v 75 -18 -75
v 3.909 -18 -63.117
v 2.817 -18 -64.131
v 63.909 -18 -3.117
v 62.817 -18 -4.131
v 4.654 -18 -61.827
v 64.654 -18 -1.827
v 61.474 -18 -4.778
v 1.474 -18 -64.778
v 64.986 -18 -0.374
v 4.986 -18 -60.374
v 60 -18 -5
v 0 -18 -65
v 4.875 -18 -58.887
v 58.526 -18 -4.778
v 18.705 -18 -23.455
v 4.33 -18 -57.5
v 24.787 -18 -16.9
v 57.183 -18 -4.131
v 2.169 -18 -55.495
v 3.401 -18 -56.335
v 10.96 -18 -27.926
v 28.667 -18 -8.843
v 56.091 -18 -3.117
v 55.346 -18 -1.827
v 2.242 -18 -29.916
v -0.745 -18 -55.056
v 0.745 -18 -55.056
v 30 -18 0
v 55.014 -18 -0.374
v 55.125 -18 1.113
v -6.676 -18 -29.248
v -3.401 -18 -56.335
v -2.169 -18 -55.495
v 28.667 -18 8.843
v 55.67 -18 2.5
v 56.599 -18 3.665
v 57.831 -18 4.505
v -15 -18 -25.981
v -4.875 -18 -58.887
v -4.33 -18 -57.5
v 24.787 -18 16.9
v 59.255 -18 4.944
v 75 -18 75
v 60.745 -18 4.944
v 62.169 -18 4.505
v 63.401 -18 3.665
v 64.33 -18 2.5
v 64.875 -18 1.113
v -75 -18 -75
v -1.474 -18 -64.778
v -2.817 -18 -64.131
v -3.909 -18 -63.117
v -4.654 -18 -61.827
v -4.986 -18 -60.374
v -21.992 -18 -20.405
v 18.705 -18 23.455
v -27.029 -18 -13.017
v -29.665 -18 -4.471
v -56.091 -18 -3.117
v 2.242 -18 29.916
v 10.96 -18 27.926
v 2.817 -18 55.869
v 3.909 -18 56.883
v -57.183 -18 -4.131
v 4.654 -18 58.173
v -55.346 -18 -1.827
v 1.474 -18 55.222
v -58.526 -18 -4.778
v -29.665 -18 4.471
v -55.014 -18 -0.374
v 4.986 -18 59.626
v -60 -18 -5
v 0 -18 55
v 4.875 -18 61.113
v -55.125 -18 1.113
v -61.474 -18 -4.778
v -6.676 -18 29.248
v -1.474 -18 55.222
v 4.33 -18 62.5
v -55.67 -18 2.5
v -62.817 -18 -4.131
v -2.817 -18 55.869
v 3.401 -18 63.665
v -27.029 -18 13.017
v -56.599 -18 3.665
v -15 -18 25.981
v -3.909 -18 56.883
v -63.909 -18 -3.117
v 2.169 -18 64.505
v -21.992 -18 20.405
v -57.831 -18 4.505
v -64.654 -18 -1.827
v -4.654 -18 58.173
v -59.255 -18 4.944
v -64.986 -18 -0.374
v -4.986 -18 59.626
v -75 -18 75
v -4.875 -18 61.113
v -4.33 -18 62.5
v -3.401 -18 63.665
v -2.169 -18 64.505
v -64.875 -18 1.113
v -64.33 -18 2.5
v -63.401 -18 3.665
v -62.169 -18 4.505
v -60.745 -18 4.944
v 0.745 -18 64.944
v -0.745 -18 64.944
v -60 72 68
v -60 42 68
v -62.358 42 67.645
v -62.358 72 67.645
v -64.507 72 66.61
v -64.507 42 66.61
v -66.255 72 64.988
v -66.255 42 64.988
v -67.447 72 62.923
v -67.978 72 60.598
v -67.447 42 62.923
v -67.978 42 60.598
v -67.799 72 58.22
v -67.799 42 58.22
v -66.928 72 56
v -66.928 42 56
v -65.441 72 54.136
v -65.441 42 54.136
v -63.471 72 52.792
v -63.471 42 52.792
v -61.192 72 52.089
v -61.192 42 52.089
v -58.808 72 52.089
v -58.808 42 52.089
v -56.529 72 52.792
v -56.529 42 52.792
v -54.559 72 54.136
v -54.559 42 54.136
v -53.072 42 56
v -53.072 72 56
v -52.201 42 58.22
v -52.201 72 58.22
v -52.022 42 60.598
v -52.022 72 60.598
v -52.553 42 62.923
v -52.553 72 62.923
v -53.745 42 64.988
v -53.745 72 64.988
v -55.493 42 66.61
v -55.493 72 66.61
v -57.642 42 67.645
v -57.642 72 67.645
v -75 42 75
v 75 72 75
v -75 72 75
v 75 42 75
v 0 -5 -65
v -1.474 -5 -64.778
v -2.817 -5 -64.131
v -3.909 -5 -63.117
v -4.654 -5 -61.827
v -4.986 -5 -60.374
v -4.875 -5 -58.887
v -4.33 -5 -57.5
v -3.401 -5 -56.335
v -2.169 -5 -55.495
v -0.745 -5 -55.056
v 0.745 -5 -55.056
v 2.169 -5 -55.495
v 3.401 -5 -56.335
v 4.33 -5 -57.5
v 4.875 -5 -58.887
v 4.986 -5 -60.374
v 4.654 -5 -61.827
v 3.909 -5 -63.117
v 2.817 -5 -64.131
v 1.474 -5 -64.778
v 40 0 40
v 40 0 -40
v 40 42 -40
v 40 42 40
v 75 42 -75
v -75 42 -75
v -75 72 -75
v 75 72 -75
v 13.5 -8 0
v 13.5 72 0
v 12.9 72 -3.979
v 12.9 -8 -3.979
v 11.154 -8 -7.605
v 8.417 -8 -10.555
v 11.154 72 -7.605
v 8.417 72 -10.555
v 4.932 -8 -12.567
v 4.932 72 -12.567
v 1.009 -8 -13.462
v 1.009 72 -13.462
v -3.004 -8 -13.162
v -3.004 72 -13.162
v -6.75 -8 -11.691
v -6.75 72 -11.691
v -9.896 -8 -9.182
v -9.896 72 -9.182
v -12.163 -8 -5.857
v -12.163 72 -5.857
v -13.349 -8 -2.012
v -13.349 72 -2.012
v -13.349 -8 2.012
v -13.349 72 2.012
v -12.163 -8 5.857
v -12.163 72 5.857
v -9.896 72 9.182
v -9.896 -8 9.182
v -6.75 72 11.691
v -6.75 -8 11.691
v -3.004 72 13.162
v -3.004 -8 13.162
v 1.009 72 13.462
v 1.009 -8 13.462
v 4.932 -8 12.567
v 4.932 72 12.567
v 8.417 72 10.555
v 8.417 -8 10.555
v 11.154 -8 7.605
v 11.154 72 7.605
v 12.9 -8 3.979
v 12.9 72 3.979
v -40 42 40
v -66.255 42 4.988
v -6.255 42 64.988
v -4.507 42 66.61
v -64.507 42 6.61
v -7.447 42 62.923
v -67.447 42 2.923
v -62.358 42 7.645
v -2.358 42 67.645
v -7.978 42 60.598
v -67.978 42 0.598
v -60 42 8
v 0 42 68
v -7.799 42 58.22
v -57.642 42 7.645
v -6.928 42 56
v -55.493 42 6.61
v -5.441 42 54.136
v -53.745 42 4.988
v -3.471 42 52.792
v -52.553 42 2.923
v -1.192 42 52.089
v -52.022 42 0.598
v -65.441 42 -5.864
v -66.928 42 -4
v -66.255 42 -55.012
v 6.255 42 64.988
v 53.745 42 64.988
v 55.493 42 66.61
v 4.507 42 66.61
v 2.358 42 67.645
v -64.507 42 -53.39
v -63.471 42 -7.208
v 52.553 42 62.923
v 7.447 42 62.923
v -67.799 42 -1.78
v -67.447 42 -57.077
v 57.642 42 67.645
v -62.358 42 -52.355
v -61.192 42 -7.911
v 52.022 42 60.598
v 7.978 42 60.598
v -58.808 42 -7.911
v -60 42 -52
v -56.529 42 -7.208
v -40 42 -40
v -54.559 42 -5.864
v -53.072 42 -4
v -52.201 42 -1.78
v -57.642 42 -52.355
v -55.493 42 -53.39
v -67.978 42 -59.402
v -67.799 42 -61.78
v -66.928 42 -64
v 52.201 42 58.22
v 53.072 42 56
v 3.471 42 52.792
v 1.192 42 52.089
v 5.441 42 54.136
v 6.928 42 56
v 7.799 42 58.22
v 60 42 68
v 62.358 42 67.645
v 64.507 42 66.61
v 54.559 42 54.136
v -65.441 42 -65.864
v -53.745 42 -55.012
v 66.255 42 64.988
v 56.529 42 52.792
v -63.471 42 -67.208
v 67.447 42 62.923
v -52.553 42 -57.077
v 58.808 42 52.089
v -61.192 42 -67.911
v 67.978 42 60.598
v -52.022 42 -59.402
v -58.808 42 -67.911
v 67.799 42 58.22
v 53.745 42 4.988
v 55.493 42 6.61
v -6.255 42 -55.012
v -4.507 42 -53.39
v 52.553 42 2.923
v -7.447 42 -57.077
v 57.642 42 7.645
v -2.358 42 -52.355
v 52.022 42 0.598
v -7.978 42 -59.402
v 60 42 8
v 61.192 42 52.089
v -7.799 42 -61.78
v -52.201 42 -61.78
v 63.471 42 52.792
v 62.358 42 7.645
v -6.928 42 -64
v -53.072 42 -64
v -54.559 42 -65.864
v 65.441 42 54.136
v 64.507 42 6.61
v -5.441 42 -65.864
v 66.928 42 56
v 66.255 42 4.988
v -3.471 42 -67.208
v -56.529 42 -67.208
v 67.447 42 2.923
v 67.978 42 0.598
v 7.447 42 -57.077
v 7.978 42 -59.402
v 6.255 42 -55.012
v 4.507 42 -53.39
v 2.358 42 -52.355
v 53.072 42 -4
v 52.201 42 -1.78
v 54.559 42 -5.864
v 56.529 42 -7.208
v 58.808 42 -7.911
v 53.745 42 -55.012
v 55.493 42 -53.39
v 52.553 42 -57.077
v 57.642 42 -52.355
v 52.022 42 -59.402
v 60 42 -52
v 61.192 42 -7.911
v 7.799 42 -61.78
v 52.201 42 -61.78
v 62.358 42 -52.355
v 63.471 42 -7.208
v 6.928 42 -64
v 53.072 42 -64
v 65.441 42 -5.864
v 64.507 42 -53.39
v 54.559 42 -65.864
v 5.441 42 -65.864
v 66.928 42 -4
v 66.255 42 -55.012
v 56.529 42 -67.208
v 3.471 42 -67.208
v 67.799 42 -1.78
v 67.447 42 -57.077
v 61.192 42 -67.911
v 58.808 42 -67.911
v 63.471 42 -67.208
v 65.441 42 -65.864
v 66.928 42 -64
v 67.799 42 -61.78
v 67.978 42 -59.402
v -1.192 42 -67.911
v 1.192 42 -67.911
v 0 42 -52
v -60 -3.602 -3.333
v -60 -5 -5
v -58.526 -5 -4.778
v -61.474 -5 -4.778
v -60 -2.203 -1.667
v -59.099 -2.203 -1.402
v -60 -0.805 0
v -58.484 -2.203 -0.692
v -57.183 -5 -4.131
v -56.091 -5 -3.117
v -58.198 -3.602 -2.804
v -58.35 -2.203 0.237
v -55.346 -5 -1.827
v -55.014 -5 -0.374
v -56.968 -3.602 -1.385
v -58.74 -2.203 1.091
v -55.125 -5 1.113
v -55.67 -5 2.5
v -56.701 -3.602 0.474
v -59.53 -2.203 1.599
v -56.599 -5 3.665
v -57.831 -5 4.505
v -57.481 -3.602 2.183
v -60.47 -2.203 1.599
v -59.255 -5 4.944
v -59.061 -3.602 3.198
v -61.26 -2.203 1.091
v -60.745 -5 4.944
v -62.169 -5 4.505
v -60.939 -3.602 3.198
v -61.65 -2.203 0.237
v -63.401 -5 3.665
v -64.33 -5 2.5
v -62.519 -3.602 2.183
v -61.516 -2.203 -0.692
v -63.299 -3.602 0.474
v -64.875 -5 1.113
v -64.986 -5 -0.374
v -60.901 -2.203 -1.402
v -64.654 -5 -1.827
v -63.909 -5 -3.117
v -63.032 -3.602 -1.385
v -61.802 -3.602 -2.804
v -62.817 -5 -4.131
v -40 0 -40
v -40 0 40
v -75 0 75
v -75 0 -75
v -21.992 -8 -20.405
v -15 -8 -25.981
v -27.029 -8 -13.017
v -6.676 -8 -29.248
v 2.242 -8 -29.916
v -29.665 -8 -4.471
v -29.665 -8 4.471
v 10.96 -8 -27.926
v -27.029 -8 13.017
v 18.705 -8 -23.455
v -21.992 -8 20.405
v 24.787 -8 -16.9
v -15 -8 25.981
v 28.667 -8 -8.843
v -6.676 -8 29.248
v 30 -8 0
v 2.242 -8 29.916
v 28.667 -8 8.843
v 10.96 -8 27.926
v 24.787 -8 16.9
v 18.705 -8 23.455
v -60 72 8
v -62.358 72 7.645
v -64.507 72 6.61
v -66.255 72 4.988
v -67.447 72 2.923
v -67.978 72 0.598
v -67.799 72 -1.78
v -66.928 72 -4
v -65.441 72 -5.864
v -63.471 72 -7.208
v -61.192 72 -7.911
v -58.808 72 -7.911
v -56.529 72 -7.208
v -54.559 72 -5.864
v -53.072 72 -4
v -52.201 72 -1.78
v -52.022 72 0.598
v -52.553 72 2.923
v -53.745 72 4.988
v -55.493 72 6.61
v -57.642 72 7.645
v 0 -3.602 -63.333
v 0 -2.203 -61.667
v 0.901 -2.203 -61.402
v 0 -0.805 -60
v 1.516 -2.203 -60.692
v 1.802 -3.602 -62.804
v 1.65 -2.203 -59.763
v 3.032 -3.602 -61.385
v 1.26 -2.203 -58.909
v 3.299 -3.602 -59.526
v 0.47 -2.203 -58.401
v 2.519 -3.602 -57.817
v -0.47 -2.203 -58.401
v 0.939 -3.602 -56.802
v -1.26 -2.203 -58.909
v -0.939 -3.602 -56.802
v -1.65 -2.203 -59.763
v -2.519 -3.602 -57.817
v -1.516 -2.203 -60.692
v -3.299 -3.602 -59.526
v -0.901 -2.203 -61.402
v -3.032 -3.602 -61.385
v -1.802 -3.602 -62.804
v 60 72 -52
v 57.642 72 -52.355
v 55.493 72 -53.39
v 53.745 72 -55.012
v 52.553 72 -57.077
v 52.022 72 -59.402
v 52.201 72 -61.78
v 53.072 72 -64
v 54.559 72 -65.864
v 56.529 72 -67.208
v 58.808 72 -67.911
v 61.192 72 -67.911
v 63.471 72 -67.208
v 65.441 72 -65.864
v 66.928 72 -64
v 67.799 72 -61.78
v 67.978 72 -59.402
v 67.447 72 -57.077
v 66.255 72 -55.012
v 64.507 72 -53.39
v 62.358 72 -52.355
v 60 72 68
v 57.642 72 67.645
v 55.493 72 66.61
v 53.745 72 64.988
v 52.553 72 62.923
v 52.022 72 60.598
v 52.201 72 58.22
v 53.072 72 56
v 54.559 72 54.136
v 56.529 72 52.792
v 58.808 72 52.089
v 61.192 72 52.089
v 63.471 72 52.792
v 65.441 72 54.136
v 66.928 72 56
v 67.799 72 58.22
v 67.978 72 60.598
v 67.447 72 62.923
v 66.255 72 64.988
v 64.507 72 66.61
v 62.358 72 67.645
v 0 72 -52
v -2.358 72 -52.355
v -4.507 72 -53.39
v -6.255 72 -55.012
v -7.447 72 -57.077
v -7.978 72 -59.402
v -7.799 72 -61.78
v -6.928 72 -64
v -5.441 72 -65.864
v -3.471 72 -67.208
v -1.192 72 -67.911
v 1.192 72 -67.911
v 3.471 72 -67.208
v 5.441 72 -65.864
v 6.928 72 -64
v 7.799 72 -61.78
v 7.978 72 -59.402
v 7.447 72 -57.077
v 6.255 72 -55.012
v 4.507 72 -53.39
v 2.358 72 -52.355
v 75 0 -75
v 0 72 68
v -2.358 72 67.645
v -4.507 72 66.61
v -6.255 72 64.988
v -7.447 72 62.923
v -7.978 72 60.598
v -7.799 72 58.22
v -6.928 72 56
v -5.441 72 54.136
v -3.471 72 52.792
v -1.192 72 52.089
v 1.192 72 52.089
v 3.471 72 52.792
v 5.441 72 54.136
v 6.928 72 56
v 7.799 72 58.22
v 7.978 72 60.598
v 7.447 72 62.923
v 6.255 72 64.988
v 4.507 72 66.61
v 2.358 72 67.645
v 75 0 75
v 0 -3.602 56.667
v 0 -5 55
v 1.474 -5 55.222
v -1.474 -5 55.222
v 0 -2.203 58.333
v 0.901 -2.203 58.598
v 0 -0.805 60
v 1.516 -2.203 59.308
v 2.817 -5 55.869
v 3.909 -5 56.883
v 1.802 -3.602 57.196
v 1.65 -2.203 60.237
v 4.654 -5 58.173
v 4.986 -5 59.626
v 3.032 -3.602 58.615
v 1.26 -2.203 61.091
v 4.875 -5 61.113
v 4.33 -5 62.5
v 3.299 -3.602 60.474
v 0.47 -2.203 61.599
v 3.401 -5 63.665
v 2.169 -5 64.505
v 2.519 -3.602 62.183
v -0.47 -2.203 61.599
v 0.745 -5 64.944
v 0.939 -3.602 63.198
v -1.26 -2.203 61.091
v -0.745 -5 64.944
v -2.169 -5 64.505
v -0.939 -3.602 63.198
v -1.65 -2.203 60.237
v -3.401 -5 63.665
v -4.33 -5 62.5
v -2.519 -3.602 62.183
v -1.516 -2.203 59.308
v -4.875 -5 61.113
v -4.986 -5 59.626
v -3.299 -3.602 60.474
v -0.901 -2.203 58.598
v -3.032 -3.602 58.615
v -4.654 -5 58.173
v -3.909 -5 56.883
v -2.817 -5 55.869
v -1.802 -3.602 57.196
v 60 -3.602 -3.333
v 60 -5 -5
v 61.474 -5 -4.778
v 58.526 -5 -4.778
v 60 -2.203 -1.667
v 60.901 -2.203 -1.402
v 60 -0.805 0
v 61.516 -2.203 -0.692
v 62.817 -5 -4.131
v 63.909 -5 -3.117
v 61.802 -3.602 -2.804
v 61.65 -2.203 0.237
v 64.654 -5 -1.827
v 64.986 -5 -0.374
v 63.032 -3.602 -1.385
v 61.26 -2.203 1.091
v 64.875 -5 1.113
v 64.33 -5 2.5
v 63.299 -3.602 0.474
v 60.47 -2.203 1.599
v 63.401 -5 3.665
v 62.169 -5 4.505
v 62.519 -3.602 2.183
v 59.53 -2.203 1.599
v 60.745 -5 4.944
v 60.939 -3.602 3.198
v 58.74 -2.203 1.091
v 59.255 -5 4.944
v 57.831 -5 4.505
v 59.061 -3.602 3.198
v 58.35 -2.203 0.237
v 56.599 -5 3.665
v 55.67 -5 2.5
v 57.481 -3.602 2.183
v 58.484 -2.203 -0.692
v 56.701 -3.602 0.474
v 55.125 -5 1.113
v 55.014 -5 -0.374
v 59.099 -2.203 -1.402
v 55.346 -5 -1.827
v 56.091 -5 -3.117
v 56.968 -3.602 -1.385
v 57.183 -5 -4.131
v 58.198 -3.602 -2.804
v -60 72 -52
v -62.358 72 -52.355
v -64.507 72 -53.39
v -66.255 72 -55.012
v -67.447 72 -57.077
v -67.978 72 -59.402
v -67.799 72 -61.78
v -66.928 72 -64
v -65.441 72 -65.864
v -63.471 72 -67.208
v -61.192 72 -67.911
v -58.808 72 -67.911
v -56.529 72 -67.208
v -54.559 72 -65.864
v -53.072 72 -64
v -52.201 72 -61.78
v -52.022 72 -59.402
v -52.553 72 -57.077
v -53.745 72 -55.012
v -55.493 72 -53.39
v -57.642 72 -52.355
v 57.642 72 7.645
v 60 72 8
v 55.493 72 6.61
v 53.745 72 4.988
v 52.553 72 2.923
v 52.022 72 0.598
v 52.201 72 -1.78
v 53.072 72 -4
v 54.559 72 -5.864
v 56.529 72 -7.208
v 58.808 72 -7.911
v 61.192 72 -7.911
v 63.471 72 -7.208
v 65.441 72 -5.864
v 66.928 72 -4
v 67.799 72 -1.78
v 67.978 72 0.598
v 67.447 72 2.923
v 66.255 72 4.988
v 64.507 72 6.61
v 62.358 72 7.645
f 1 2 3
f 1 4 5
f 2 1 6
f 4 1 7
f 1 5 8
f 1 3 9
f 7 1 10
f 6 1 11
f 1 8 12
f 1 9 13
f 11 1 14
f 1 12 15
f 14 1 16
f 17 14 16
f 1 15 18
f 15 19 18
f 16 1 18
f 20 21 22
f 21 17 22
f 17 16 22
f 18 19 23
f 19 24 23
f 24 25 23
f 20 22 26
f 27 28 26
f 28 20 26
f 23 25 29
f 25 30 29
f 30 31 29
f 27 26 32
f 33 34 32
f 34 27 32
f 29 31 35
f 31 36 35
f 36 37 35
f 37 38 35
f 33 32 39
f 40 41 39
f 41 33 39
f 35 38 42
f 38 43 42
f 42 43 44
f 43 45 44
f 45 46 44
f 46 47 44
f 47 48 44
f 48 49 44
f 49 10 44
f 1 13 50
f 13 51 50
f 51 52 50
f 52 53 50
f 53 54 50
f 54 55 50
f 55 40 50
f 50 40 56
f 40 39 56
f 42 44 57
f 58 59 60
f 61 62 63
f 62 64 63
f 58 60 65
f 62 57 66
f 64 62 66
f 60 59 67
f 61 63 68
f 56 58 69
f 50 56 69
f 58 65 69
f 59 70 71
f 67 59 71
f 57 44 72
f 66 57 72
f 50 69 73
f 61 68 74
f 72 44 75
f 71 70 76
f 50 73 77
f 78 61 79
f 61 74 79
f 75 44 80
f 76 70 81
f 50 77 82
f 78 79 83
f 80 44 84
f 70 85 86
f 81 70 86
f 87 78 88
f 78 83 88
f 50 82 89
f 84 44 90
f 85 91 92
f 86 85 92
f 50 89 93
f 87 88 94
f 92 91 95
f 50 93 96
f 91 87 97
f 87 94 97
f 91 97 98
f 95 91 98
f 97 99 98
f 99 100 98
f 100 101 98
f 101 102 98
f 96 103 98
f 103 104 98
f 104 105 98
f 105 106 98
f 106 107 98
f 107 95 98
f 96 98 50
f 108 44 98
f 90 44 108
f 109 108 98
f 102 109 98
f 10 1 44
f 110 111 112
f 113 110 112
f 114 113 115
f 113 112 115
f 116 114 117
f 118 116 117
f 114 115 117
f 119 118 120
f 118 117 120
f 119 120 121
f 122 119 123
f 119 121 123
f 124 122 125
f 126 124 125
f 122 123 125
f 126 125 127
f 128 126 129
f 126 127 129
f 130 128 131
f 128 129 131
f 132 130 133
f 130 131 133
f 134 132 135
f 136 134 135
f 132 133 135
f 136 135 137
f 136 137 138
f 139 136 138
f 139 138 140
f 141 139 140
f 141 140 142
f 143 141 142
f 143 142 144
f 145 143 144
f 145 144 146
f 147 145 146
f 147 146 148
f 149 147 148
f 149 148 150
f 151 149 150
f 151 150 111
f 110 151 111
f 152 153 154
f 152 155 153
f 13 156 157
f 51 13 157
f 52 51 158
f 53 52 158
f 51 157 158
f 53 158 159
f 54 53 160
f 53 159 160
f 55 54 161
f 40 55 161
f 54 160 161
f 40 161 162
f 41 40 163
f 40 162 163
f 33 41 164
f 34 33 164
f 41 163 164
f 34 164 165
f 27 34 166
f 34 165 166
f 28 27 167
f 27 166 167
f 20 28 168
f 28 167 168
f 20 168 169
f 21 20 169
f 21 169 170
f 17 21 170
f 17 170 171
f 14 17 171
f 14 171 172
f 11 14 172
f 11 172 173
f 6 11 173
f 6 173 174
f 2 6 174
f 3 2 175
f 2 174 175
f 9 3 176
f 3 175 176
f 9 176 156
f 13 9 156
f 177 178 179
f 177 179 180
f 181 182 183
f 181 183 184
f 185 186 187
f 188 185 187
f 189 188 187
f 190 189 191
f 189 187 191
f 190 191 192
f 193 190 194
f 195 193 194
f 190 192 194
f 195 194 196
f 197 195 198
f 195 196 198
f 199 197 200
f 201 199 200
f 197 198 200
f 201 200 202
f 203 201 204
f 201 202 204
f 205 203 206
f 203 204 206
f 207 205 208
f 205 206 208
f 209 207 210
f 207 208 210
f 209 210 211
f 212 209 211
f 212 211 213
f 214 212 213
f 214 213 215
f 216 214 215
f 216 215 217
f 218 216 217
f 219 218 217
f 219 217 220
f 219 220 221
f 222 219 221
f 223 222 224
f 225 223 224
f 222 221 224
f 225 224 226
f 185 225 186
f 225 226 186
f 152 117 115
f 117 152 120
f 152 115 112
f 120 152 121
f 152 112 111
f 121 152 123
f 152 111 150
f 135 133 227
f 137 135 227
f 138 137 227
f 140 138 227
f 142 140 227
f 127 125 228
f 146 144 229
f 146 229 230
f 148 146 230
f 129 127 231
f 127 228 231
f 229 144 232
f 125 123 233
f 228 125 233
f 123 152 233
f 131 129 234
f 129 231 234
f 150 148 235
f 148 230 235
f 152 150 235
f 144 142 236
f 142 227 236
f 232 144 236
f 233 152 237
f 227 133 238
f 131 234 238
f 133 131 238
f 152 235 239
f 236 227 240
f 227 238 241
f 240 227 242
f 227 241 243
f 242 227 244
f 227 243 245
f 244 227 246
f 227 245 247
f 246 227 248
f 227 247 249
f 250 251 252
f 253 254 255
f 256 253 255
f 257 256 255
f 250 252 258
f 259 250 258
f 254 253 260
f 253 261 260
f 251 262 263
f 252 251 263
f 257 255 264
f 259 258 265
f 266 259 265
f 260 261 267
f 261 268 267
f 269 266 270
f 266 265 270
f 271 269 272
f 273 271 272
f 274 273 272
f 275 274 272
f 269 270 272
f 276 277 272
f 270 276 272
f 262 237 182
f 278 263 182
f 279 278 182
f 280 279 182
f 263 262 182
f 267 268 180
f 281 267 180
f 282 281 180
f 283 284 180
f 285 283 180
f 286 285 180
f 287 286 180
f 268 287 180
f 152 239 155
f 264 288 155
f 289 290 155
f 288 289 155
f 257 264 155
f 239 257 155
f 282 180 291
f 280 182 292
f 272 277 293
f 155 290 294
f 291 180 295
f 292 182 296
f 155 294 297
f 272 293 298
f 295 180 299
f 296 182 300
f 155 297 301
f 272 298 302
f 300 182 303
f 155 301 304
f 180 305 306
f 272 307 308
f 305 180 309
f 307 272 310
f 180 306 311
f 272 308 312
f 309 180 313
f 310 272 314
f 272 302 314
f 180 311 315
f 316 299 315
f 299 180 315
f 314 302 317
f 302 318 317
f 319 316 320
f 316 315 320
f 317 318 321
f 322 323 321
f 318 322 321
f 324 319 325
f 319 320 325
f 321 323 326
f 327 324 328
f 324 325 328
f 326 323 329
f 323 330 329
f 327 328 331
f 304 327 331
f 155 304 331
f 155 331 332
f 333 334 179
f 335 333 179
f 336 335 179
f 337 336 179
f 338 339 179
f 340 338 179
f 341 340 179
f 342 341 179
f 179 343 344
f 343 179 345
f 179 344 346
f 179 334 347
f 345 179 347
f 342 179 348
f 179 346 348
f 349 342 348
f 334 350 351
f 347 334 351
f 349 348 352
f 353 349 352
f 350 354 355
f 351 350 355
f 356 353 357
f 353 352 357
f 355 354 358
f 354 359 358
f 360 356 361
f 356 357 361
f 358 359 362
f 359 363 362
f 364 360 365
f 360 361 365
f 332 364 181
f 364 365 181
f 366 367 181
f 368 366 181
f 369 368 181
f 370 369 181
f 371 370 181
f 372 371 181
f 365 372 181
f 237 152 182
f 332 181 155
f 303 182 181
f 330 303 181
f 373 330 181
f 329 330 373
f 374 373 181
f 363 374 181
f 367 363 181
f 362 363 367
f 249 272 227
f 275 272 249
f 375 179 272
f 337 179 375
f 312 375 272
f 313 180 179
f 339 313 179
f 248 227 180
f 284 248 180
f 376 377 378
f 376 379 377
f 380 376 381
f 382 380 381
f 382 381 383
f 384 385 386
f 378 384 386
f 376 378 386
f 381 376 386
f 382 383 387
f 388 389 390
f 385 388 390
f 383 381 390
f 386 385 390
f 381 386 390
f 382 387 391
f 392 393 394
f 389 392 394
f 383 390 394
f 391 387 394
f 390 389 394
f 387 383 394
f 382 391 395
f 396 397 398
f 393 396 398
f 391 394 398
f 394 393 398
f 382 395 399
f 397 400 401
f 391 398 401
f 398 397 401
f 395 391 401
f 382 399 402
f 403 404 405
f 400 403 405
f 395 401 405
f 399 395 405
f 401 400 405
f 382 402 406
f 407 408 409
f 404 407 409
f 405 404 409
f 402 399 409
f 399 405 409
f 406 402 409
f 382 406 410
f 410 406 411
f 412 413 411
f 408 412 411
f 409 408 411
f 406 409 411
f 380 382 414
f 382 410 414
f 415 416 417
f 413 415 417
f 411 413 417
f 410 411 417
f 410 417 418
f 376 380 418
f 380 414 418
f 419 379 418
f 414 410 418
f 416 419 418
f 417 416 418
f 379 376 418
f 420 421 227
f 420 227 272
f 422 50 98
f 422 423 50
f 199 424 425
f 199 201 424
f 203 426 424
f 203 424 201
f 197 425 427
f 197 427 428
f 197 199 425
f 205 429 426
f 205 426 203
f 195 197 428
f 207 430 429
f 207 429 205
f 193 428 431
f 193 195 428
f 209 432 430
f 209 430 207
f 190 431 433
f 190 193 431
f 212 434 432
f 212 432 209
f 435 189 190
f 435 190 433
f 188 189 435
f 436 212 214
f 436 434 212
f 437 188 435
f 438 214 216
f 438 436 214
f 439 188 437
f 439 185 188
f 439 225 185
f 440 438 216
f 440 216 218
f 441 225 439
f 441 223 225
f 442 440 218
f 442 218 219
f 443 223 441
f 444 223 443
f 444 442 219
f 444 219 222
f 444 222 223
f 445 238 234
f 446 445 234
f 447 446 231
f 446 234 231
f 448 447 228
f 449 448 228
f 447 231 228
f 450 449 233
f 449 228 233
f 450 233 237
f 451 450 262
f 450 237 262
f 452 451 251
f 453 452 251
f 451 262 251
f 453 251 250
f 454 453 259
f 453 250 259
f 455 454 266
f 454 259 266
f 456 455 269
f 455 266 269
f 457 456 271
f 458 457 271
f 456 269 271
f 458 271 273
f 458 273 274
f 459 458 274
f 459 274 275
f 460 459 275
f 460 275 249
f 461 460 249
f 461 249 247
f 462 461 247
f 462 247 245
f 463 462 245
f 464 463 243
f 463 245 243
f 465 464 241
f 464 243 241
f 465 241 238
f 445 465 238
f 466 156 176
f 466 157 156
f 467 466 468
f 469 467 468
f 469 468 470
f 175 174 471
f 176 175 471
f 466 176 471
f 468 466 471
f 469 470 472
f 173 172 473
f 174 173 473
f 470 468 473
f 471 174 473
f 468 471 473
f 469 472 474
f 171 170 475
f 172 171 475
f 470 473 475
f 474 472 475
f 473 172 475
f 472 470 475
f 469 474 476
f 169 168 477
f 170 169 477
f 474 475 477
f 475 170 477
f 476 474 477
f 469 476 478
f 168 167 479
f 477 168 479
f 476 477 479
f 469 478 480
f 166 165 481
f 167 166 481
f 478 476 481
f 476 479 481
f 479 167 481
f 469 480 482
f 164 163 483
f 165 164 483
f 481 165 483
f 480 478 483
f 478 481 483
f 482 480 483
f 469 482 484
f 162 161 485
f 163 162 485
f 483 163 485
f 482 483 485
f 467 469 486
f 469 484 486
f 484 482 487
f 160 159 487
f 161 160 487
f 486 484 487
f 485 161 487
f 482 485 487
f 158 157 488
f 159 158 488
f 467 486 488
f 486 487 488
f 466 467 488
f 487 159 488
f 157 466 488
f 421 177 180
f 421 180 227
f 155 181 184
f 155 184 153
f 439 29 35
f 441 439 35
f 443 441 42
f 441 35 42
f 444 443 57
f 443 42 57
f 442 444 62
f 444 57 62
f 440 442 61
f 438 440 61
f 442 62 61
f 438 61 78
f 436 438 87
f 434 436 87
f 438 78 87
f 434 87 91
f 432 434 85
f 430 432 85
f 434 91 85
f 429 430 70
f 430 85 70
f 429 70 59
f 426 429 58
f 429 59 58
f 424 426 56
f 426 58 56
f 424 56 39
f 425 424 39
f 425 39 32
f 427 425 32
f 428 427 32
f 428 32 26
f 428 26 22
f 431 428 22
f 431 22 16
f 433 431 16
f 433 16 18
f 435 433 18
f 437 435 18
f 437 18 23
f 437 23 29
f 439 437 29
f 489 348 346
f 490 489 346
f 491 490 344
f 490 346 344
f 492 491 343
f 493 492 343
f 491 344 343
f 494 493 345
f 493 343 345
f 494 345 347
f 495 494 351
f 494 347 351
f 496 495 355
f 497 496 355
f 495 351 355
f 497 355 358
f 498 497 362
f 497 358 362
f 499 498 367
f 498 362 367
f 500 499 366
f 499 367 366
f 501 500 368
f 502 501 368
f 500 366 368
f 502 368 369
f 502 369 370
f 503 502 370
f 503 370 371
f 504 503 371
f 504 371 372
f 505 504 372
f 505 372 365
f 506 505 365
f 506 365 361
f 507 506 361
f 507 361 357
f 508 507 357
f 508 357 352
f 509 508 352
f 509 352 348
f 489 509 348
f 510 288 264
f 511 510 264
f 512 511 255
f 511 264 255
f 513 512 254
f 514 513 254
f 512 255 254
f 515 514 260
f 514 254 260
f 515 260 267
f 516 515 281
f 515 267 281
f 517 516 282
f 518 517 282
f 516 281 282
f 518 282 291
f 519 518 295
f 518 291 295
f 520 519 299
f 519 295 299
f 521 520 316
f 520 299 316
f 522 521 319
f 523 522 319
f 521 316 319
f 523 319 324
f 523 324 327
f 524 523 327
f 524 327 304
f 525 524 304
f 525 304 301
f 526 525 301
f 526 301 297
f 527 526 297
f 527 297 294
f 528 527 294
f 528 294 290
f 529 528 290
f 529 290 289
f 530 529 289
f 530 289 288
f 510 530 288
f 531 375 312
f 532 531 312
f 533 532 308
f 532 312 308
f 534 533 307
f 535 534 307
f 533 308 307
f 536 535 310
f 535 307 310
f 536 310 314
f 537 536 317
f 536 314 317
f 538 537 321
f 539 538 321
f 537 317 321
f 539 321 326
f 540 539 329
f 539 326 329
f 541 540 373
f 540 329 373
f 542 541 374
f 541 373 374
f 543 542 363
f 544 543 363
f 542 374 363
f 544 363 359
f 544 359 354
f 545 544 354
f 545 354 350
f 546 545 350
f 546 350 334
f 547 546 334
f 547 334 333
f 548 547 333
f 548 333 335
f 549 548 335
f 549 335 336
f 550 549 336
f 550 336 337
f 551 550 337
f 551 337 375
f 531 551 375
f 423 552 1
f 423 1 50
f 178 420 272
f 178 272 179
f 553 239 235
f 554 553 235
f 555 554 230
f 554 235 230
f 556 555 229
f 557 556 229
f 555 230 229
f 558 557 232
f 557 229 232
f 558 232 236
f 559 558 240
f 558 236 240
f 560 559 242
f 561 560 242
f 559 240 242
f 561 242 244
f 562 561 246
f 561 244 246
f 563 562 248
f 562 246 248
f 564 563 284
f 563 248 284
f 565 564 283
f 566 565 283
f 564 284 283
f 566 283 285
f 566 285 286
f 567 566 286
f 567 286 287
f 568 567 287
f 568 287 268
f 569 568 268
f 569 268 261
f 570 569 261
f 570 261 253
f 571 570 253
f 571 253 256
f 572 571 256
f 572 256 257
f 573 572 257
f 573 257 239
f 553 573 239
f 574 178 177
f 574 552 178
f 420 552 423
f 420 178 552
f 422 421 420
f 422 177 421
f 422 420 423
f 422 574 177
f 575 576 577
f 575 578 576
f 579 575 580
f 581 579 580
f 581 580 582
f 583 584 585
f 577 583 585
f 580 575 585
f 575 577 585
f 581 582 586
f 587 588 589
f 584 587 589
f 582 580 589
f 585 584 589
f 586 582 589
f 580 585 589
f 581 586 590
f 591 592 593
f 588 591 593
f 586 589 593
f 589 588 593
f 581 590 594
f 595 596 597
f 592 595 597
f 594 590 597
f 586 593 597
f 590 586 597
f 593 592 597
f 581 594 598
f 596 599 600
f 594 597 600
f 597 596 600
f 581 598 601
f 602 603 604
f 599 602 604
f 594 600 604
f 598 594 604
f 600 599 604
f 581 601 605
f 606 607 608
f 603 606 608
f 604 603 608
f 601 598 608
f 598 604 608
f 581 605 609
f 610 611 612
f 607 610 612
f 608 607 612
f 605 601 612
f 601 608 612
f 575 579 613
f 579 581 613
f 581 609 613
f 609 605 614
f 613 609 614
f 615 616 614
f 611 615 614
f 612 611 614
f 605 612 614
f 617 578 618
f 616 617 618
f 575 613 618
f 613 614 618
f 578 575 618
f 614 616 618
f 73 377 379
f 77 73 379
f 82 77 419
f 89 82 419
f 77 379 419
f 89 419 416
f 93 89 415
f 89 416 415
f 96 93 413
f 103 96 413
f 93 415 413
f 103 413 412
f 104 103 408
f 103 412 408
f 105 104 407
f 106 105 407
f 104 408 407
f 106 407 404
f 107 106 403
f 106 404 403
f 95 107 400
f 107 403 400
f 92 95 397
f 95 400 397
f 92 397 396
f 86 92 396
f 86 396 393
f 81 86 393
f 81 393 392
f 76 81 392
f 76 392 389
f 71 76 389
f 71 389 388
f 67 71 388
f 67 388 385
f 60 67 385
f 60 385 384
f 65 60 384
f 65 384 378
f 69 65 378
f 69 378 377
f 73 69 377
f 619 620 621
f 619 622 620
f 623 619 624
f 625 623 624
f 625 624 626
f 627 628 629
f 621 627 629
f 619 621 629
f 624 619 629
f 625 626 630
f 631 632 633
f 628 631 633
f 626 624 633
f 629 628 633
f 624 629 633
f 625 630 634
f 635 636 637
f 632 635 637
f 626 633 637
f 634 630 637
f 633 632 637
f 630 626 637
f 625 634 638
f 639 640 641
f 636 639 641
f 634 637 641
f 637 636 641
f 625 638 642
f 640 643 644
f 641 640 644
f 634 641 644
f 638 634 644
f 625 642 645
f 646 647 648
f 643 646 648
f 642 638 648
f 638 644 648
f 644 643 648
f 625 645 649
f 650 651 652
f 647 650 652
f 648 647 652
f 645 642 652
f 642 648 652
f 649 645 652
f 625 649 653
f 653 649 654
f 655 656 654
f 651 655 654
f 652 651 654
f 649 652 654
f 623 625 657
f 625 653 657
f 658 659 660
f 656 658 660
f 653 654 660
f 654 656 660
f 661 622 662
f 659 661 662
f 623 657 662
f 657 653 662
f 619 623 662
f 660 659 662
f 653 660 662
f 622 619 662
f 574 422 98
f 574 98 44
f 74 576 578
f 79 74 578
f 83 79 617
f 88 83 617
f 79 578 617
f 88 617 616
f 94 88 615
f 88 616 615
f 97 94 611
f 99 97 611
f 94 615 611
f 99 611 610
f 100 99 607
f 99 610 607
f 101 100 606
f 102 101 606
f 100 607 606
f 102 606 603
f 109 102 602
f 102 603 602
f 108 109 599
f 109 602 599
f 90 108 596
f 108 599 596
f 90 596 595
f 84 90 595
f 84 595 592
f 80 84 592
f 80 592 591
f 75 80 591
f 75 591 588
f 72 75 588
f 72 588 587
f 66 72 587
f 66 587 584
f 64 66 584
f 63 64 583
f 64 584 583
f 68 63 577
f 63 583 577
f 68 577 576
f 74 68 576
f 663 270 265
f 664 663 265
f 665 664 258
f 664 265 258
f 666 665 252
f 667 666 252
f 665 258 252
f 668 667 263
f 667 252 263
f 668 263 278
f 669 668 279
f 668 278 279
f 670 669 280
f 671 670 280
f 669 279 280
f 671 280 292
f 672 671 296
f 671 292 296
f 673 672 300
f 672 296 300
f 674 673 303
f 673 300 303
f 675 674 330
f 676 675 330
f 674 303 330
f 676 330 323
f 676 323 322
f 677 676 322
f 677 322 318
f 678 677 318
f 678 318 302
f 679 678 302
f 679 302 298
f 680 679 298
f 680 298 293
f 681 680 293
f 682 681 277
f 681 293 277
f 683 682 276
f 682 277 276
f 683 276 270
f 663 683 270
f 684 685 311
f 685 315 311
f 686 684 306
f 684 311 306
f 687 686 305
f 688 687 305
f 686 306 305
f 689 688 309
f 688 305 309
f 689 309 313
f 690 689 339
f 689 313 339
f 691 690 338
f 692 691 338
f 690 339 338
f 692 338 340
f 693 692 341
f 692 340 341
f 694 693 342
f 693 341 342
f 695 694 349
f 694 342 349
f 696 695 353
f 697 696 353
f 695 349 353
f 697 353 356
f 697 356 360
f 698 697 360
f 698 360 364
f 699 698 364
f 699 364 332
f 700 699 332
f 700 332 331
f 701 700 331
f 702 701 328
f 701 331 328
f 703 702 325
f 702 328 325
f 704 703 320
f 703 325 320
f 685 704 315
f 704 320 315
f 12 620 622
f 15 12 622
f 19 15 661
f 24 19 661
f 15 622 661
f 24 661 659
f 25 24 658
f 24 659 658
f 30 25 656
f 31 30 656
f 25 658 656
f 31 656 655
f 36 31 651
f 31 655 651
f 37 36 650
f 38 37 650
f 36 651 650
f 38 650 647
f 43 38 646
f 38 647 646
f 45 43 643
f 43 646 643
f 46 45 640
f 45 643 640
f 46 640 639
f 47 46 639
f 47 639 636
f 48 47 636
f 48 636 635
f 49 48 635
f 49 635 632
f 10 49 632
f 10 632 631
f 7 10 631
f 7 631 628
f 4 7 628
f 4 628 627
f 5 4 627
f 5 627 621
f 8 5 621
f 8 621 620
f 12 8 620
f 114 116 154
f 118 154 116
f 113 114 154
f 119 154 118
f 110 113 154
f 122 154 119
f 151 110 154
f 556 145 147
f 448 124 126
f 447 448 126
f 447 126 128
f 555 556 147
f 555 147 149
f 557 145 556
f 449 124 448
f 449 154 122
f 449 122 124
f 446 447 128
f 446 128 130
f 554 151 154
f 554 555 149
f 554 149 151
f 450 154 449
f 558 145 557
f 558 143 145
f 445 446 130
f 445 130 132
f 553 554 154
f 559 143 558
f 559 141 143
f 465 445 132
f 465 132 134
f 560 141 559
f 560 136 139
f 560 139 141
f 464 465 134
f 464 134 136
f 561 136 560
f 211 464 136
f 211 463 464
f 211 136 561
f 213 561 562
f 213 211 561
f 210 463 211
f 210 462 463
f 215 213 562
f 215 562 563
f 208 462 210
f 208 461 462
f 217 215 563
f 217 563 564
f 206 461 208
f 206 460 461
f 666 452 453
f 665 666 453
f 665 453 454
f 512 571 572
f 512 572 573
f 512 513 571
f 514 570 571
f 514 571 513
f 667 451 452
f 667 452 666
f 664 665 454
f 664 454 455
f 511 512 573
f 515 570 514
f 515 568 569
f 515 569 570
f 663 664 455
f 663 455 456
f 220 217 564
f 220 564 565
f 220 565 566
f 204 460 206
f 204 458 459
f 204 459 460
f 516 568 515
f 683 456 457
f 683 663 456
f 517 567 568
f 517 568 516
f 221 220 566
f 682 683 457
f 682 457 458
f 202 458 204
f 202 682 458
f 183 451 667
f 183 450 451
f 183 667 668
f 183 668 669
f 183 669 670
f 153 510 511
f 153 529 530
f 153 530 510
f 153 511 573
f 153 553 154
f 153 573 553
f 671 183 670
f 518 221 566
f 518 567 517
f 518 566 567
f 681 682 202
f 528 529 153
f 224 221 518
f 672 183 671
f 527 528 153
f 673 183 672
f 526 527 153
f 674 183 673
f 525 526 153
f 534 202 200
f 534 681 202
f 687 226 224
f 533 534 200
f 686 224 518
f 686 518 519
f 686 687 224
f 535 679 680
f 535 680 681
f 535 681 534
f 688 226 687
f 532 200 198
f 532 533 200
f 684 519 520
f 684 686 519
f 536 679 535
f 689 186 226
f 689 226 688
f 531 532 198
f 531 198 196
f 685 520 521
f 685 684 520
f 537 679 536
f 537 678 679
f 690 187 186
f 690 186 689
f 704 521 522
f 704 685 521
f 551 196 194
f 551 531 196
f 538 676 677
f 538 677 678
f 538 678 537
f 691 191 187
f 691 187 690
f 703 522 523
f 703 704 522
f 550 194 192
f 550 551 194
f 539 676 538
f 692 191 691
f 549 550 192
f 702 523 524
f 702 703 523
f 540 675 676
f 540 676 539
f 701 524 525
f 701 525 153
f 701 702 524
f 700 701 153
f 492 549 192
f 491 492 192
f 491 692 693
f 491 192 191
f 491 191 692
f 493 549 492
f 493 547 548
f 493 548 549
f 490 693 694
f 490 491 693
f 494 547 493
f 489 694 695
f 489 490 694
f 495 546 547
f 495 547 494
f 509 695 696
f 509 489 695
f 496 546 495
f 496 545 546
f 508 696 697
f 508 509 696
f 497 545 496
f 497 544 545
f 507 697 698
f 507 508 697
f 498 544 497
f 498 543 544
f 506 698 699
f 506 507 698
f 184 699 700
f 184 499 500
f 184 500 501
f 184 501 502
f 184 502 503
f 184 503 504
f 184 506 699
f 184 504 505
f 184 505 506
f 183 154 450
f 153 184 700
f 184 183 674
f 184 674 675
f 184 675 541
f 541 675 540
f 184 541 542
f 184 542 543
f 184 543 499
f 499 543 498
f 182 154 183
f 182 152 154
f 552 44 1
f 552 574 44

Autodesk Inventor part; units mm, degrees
ref_plane "YZ Plane" through (0, 0, 0) normal (1, 0, 0) x (0, 1, 0)
ref_plane "XZ Plane" through (0, 0, 0) normal (0, 1, 0) x (-1, 0, 0)
ref_plane "XY Plane" through (0, 0, 0) normal (0, 0, 1) x (1, 0, 0)
sketch "Sketch1" plane through (0, 0, 0) normal (0, 1, 0) x (-1, 0, 0)
  line L0 (-75, -75) -> (75, -75)
  line L1 (75, -75) -> (75, 75)
  line L2 (75, 75) -> (-75, 75)
  line L3 (-75, 75) -> (-75, -75)
  line L4 (-75, -75) -> (75, 75) construction
  line L5 (75, -75) -> (-75, 75) construction
  point P0 (0, 0)
  dimension "d0" = 150
  dimension "d1" = 150
extrude "Extrusion1" add sketch "Sketch1" against normal blind 18
sketch "Sketch2" plane through (0, -18, 0) normal (0, -1, 0) x (1, 0, 0)
  circle A0 centre (0, 0) radius 30
  line L0 (-60, -60) -> (60, -60) construction
  line L1 (60, -60) -> (60, 60) construction
  line L2 (60, 60) -> (-60, 60) construction
  line L3 (-60, 60) -> (-60, -60) construction
  line L4 (-60, -60) -> (60, 60) construction
  line L5 (60, -60) -> (-60, 60) construction
  dimension "d4" = 60
  dimension "d5" = 120
  dimension "d6" = 120
extrude "Extrusion2" cut sketch "Sketch2" against normal blind 10
sketch "Sketch3" plane through (0, -18, 0) normal (0, -1, 0) x (1, 0, 0)
  line L0 (60, -60) -> (60, 60) construction
  line L1 (60, 60) -> (-60, 60) construction
  line L2 (-60, 60) -> (-60, -60) construction
  line L3 (-60, -60) -> (60, -60) construction
  point P0 (0, 0)
  point P1 (60, 0)
  point P2 (-60, 0)
  point P3 (0, 60)
  point P4 (0, -60)
hole "Hole1" at (0, -18, 60) at (-60, -18, 0) at (0, -18, -60) at (60, -18, 0) direction (0, 1, 0) diameter 10 depth 13 tip angle 100
sketch "Sketch4" plane through (0, 0, 0) normal (0, 1, 0) x (1, 0, 0)
  line L0 (40, -40) -> (-40, -40)
  line L1 (-40, -40) -> (-40, 40)
  line L2 (-40, 40) -> (40, 40)
  line L3 (40, 40) -> (40, -40)
  line L4 (40, -40) -> (-40, 40) construction
  line L5 (-40, -40) -> (40, 40) construction
  point P0 (0, 0)
  dimension "d16" = 80
  dimension "d17" = 80
extrude "Extrusion3" add sketch "Sketch4" along normal blind 42
sketch "Sketch5" plane through (0, 42, 0) normal (0, 1, 0) x (1, 0, 0)
  line L0 (75, -75) -> (-75, -75)
  line L1 (-75, -75) -> (-75, 75)
  line L2 (-75, 75) -> (75, 75)
  line L3 (75, 75) -> (75, -75)
  line L4 (75, -75) -> (-75, 75) construction
  line L5 (-75, -75) -> (75, 75) construction
  point P0 (0, 0)
extrude "Extrusion4" add sketch "Sketch5" along normal blind 30
sketch "Sketch6" plane through (0, 72, 0) normal (0, 1, 0) x (1, 0, 0)
  circle A0 centre (0, 0) radius 13.5
  dimension "d22" = 27
extrude "Extrusion5" cut sketch "Sketch6" against normal through all
sketch "Sketch7" plane through (0, 72, 0) normal (0, 1, 0) x (1, 0, 0)
  line L0 (60, 60) -> (-60, 60) construction
  line L1 (-60, 60) -> (-60, -60) construction
  line L2 (-60, -60) -> (60, -60) construction
  line L3 (60, -60) -> (60, 60) construction
  line L4 (60, 60) -> (-60, -60) construction
  line L5 (-60, 60) -> (60, -60) construction
  point P0 (0, 0)
  point P1 (0, 60)
  point P2 (-60, 0)
  point P3 (0, -60)
  point P4 (60, 0)
  dimension "d25" = 120
  dimension "d26" = 120
hole "Hole2" at (-60, 72, 60) at (0, 72, 60) at (60, 72, 60) at (60, 72, 0) at (60, 72, -60) at (0, 72, -60) at (-60, 72, -60) at (-60, 72, 0) direction (0, -1, 0) diameter 16 depth 30
thread "Thread2" size "M16x2" class "6H" standard "ANSI Metric M Profile" length 56
thread "Thread3" size "M16x2" class "6H" standard "ANSI Metric M Profile" length 56
thread "Thread4" size "M16x2" class "6H" standard "ANSI Metric M Profile" length 56
thread "Thread5" size "M16x2" class "6H" standard "ANSI Metric M Profile" length 56
thread "Thread6" size "M16x2" class "6H" standard "ANSI Metric M Profile" length 56
thread "Thread7" size "M16x2" class "6H" standard "ANSI Metric M Profile" length 56
thread "Thread8" size "M16x2" class "6H" standard "ANSI Metric M Profile" length 56
thread "Thread9" size "M16x2" class "6H" standard "ANSI Metric M Profile" length 56
properties material "Iron, Cast"
